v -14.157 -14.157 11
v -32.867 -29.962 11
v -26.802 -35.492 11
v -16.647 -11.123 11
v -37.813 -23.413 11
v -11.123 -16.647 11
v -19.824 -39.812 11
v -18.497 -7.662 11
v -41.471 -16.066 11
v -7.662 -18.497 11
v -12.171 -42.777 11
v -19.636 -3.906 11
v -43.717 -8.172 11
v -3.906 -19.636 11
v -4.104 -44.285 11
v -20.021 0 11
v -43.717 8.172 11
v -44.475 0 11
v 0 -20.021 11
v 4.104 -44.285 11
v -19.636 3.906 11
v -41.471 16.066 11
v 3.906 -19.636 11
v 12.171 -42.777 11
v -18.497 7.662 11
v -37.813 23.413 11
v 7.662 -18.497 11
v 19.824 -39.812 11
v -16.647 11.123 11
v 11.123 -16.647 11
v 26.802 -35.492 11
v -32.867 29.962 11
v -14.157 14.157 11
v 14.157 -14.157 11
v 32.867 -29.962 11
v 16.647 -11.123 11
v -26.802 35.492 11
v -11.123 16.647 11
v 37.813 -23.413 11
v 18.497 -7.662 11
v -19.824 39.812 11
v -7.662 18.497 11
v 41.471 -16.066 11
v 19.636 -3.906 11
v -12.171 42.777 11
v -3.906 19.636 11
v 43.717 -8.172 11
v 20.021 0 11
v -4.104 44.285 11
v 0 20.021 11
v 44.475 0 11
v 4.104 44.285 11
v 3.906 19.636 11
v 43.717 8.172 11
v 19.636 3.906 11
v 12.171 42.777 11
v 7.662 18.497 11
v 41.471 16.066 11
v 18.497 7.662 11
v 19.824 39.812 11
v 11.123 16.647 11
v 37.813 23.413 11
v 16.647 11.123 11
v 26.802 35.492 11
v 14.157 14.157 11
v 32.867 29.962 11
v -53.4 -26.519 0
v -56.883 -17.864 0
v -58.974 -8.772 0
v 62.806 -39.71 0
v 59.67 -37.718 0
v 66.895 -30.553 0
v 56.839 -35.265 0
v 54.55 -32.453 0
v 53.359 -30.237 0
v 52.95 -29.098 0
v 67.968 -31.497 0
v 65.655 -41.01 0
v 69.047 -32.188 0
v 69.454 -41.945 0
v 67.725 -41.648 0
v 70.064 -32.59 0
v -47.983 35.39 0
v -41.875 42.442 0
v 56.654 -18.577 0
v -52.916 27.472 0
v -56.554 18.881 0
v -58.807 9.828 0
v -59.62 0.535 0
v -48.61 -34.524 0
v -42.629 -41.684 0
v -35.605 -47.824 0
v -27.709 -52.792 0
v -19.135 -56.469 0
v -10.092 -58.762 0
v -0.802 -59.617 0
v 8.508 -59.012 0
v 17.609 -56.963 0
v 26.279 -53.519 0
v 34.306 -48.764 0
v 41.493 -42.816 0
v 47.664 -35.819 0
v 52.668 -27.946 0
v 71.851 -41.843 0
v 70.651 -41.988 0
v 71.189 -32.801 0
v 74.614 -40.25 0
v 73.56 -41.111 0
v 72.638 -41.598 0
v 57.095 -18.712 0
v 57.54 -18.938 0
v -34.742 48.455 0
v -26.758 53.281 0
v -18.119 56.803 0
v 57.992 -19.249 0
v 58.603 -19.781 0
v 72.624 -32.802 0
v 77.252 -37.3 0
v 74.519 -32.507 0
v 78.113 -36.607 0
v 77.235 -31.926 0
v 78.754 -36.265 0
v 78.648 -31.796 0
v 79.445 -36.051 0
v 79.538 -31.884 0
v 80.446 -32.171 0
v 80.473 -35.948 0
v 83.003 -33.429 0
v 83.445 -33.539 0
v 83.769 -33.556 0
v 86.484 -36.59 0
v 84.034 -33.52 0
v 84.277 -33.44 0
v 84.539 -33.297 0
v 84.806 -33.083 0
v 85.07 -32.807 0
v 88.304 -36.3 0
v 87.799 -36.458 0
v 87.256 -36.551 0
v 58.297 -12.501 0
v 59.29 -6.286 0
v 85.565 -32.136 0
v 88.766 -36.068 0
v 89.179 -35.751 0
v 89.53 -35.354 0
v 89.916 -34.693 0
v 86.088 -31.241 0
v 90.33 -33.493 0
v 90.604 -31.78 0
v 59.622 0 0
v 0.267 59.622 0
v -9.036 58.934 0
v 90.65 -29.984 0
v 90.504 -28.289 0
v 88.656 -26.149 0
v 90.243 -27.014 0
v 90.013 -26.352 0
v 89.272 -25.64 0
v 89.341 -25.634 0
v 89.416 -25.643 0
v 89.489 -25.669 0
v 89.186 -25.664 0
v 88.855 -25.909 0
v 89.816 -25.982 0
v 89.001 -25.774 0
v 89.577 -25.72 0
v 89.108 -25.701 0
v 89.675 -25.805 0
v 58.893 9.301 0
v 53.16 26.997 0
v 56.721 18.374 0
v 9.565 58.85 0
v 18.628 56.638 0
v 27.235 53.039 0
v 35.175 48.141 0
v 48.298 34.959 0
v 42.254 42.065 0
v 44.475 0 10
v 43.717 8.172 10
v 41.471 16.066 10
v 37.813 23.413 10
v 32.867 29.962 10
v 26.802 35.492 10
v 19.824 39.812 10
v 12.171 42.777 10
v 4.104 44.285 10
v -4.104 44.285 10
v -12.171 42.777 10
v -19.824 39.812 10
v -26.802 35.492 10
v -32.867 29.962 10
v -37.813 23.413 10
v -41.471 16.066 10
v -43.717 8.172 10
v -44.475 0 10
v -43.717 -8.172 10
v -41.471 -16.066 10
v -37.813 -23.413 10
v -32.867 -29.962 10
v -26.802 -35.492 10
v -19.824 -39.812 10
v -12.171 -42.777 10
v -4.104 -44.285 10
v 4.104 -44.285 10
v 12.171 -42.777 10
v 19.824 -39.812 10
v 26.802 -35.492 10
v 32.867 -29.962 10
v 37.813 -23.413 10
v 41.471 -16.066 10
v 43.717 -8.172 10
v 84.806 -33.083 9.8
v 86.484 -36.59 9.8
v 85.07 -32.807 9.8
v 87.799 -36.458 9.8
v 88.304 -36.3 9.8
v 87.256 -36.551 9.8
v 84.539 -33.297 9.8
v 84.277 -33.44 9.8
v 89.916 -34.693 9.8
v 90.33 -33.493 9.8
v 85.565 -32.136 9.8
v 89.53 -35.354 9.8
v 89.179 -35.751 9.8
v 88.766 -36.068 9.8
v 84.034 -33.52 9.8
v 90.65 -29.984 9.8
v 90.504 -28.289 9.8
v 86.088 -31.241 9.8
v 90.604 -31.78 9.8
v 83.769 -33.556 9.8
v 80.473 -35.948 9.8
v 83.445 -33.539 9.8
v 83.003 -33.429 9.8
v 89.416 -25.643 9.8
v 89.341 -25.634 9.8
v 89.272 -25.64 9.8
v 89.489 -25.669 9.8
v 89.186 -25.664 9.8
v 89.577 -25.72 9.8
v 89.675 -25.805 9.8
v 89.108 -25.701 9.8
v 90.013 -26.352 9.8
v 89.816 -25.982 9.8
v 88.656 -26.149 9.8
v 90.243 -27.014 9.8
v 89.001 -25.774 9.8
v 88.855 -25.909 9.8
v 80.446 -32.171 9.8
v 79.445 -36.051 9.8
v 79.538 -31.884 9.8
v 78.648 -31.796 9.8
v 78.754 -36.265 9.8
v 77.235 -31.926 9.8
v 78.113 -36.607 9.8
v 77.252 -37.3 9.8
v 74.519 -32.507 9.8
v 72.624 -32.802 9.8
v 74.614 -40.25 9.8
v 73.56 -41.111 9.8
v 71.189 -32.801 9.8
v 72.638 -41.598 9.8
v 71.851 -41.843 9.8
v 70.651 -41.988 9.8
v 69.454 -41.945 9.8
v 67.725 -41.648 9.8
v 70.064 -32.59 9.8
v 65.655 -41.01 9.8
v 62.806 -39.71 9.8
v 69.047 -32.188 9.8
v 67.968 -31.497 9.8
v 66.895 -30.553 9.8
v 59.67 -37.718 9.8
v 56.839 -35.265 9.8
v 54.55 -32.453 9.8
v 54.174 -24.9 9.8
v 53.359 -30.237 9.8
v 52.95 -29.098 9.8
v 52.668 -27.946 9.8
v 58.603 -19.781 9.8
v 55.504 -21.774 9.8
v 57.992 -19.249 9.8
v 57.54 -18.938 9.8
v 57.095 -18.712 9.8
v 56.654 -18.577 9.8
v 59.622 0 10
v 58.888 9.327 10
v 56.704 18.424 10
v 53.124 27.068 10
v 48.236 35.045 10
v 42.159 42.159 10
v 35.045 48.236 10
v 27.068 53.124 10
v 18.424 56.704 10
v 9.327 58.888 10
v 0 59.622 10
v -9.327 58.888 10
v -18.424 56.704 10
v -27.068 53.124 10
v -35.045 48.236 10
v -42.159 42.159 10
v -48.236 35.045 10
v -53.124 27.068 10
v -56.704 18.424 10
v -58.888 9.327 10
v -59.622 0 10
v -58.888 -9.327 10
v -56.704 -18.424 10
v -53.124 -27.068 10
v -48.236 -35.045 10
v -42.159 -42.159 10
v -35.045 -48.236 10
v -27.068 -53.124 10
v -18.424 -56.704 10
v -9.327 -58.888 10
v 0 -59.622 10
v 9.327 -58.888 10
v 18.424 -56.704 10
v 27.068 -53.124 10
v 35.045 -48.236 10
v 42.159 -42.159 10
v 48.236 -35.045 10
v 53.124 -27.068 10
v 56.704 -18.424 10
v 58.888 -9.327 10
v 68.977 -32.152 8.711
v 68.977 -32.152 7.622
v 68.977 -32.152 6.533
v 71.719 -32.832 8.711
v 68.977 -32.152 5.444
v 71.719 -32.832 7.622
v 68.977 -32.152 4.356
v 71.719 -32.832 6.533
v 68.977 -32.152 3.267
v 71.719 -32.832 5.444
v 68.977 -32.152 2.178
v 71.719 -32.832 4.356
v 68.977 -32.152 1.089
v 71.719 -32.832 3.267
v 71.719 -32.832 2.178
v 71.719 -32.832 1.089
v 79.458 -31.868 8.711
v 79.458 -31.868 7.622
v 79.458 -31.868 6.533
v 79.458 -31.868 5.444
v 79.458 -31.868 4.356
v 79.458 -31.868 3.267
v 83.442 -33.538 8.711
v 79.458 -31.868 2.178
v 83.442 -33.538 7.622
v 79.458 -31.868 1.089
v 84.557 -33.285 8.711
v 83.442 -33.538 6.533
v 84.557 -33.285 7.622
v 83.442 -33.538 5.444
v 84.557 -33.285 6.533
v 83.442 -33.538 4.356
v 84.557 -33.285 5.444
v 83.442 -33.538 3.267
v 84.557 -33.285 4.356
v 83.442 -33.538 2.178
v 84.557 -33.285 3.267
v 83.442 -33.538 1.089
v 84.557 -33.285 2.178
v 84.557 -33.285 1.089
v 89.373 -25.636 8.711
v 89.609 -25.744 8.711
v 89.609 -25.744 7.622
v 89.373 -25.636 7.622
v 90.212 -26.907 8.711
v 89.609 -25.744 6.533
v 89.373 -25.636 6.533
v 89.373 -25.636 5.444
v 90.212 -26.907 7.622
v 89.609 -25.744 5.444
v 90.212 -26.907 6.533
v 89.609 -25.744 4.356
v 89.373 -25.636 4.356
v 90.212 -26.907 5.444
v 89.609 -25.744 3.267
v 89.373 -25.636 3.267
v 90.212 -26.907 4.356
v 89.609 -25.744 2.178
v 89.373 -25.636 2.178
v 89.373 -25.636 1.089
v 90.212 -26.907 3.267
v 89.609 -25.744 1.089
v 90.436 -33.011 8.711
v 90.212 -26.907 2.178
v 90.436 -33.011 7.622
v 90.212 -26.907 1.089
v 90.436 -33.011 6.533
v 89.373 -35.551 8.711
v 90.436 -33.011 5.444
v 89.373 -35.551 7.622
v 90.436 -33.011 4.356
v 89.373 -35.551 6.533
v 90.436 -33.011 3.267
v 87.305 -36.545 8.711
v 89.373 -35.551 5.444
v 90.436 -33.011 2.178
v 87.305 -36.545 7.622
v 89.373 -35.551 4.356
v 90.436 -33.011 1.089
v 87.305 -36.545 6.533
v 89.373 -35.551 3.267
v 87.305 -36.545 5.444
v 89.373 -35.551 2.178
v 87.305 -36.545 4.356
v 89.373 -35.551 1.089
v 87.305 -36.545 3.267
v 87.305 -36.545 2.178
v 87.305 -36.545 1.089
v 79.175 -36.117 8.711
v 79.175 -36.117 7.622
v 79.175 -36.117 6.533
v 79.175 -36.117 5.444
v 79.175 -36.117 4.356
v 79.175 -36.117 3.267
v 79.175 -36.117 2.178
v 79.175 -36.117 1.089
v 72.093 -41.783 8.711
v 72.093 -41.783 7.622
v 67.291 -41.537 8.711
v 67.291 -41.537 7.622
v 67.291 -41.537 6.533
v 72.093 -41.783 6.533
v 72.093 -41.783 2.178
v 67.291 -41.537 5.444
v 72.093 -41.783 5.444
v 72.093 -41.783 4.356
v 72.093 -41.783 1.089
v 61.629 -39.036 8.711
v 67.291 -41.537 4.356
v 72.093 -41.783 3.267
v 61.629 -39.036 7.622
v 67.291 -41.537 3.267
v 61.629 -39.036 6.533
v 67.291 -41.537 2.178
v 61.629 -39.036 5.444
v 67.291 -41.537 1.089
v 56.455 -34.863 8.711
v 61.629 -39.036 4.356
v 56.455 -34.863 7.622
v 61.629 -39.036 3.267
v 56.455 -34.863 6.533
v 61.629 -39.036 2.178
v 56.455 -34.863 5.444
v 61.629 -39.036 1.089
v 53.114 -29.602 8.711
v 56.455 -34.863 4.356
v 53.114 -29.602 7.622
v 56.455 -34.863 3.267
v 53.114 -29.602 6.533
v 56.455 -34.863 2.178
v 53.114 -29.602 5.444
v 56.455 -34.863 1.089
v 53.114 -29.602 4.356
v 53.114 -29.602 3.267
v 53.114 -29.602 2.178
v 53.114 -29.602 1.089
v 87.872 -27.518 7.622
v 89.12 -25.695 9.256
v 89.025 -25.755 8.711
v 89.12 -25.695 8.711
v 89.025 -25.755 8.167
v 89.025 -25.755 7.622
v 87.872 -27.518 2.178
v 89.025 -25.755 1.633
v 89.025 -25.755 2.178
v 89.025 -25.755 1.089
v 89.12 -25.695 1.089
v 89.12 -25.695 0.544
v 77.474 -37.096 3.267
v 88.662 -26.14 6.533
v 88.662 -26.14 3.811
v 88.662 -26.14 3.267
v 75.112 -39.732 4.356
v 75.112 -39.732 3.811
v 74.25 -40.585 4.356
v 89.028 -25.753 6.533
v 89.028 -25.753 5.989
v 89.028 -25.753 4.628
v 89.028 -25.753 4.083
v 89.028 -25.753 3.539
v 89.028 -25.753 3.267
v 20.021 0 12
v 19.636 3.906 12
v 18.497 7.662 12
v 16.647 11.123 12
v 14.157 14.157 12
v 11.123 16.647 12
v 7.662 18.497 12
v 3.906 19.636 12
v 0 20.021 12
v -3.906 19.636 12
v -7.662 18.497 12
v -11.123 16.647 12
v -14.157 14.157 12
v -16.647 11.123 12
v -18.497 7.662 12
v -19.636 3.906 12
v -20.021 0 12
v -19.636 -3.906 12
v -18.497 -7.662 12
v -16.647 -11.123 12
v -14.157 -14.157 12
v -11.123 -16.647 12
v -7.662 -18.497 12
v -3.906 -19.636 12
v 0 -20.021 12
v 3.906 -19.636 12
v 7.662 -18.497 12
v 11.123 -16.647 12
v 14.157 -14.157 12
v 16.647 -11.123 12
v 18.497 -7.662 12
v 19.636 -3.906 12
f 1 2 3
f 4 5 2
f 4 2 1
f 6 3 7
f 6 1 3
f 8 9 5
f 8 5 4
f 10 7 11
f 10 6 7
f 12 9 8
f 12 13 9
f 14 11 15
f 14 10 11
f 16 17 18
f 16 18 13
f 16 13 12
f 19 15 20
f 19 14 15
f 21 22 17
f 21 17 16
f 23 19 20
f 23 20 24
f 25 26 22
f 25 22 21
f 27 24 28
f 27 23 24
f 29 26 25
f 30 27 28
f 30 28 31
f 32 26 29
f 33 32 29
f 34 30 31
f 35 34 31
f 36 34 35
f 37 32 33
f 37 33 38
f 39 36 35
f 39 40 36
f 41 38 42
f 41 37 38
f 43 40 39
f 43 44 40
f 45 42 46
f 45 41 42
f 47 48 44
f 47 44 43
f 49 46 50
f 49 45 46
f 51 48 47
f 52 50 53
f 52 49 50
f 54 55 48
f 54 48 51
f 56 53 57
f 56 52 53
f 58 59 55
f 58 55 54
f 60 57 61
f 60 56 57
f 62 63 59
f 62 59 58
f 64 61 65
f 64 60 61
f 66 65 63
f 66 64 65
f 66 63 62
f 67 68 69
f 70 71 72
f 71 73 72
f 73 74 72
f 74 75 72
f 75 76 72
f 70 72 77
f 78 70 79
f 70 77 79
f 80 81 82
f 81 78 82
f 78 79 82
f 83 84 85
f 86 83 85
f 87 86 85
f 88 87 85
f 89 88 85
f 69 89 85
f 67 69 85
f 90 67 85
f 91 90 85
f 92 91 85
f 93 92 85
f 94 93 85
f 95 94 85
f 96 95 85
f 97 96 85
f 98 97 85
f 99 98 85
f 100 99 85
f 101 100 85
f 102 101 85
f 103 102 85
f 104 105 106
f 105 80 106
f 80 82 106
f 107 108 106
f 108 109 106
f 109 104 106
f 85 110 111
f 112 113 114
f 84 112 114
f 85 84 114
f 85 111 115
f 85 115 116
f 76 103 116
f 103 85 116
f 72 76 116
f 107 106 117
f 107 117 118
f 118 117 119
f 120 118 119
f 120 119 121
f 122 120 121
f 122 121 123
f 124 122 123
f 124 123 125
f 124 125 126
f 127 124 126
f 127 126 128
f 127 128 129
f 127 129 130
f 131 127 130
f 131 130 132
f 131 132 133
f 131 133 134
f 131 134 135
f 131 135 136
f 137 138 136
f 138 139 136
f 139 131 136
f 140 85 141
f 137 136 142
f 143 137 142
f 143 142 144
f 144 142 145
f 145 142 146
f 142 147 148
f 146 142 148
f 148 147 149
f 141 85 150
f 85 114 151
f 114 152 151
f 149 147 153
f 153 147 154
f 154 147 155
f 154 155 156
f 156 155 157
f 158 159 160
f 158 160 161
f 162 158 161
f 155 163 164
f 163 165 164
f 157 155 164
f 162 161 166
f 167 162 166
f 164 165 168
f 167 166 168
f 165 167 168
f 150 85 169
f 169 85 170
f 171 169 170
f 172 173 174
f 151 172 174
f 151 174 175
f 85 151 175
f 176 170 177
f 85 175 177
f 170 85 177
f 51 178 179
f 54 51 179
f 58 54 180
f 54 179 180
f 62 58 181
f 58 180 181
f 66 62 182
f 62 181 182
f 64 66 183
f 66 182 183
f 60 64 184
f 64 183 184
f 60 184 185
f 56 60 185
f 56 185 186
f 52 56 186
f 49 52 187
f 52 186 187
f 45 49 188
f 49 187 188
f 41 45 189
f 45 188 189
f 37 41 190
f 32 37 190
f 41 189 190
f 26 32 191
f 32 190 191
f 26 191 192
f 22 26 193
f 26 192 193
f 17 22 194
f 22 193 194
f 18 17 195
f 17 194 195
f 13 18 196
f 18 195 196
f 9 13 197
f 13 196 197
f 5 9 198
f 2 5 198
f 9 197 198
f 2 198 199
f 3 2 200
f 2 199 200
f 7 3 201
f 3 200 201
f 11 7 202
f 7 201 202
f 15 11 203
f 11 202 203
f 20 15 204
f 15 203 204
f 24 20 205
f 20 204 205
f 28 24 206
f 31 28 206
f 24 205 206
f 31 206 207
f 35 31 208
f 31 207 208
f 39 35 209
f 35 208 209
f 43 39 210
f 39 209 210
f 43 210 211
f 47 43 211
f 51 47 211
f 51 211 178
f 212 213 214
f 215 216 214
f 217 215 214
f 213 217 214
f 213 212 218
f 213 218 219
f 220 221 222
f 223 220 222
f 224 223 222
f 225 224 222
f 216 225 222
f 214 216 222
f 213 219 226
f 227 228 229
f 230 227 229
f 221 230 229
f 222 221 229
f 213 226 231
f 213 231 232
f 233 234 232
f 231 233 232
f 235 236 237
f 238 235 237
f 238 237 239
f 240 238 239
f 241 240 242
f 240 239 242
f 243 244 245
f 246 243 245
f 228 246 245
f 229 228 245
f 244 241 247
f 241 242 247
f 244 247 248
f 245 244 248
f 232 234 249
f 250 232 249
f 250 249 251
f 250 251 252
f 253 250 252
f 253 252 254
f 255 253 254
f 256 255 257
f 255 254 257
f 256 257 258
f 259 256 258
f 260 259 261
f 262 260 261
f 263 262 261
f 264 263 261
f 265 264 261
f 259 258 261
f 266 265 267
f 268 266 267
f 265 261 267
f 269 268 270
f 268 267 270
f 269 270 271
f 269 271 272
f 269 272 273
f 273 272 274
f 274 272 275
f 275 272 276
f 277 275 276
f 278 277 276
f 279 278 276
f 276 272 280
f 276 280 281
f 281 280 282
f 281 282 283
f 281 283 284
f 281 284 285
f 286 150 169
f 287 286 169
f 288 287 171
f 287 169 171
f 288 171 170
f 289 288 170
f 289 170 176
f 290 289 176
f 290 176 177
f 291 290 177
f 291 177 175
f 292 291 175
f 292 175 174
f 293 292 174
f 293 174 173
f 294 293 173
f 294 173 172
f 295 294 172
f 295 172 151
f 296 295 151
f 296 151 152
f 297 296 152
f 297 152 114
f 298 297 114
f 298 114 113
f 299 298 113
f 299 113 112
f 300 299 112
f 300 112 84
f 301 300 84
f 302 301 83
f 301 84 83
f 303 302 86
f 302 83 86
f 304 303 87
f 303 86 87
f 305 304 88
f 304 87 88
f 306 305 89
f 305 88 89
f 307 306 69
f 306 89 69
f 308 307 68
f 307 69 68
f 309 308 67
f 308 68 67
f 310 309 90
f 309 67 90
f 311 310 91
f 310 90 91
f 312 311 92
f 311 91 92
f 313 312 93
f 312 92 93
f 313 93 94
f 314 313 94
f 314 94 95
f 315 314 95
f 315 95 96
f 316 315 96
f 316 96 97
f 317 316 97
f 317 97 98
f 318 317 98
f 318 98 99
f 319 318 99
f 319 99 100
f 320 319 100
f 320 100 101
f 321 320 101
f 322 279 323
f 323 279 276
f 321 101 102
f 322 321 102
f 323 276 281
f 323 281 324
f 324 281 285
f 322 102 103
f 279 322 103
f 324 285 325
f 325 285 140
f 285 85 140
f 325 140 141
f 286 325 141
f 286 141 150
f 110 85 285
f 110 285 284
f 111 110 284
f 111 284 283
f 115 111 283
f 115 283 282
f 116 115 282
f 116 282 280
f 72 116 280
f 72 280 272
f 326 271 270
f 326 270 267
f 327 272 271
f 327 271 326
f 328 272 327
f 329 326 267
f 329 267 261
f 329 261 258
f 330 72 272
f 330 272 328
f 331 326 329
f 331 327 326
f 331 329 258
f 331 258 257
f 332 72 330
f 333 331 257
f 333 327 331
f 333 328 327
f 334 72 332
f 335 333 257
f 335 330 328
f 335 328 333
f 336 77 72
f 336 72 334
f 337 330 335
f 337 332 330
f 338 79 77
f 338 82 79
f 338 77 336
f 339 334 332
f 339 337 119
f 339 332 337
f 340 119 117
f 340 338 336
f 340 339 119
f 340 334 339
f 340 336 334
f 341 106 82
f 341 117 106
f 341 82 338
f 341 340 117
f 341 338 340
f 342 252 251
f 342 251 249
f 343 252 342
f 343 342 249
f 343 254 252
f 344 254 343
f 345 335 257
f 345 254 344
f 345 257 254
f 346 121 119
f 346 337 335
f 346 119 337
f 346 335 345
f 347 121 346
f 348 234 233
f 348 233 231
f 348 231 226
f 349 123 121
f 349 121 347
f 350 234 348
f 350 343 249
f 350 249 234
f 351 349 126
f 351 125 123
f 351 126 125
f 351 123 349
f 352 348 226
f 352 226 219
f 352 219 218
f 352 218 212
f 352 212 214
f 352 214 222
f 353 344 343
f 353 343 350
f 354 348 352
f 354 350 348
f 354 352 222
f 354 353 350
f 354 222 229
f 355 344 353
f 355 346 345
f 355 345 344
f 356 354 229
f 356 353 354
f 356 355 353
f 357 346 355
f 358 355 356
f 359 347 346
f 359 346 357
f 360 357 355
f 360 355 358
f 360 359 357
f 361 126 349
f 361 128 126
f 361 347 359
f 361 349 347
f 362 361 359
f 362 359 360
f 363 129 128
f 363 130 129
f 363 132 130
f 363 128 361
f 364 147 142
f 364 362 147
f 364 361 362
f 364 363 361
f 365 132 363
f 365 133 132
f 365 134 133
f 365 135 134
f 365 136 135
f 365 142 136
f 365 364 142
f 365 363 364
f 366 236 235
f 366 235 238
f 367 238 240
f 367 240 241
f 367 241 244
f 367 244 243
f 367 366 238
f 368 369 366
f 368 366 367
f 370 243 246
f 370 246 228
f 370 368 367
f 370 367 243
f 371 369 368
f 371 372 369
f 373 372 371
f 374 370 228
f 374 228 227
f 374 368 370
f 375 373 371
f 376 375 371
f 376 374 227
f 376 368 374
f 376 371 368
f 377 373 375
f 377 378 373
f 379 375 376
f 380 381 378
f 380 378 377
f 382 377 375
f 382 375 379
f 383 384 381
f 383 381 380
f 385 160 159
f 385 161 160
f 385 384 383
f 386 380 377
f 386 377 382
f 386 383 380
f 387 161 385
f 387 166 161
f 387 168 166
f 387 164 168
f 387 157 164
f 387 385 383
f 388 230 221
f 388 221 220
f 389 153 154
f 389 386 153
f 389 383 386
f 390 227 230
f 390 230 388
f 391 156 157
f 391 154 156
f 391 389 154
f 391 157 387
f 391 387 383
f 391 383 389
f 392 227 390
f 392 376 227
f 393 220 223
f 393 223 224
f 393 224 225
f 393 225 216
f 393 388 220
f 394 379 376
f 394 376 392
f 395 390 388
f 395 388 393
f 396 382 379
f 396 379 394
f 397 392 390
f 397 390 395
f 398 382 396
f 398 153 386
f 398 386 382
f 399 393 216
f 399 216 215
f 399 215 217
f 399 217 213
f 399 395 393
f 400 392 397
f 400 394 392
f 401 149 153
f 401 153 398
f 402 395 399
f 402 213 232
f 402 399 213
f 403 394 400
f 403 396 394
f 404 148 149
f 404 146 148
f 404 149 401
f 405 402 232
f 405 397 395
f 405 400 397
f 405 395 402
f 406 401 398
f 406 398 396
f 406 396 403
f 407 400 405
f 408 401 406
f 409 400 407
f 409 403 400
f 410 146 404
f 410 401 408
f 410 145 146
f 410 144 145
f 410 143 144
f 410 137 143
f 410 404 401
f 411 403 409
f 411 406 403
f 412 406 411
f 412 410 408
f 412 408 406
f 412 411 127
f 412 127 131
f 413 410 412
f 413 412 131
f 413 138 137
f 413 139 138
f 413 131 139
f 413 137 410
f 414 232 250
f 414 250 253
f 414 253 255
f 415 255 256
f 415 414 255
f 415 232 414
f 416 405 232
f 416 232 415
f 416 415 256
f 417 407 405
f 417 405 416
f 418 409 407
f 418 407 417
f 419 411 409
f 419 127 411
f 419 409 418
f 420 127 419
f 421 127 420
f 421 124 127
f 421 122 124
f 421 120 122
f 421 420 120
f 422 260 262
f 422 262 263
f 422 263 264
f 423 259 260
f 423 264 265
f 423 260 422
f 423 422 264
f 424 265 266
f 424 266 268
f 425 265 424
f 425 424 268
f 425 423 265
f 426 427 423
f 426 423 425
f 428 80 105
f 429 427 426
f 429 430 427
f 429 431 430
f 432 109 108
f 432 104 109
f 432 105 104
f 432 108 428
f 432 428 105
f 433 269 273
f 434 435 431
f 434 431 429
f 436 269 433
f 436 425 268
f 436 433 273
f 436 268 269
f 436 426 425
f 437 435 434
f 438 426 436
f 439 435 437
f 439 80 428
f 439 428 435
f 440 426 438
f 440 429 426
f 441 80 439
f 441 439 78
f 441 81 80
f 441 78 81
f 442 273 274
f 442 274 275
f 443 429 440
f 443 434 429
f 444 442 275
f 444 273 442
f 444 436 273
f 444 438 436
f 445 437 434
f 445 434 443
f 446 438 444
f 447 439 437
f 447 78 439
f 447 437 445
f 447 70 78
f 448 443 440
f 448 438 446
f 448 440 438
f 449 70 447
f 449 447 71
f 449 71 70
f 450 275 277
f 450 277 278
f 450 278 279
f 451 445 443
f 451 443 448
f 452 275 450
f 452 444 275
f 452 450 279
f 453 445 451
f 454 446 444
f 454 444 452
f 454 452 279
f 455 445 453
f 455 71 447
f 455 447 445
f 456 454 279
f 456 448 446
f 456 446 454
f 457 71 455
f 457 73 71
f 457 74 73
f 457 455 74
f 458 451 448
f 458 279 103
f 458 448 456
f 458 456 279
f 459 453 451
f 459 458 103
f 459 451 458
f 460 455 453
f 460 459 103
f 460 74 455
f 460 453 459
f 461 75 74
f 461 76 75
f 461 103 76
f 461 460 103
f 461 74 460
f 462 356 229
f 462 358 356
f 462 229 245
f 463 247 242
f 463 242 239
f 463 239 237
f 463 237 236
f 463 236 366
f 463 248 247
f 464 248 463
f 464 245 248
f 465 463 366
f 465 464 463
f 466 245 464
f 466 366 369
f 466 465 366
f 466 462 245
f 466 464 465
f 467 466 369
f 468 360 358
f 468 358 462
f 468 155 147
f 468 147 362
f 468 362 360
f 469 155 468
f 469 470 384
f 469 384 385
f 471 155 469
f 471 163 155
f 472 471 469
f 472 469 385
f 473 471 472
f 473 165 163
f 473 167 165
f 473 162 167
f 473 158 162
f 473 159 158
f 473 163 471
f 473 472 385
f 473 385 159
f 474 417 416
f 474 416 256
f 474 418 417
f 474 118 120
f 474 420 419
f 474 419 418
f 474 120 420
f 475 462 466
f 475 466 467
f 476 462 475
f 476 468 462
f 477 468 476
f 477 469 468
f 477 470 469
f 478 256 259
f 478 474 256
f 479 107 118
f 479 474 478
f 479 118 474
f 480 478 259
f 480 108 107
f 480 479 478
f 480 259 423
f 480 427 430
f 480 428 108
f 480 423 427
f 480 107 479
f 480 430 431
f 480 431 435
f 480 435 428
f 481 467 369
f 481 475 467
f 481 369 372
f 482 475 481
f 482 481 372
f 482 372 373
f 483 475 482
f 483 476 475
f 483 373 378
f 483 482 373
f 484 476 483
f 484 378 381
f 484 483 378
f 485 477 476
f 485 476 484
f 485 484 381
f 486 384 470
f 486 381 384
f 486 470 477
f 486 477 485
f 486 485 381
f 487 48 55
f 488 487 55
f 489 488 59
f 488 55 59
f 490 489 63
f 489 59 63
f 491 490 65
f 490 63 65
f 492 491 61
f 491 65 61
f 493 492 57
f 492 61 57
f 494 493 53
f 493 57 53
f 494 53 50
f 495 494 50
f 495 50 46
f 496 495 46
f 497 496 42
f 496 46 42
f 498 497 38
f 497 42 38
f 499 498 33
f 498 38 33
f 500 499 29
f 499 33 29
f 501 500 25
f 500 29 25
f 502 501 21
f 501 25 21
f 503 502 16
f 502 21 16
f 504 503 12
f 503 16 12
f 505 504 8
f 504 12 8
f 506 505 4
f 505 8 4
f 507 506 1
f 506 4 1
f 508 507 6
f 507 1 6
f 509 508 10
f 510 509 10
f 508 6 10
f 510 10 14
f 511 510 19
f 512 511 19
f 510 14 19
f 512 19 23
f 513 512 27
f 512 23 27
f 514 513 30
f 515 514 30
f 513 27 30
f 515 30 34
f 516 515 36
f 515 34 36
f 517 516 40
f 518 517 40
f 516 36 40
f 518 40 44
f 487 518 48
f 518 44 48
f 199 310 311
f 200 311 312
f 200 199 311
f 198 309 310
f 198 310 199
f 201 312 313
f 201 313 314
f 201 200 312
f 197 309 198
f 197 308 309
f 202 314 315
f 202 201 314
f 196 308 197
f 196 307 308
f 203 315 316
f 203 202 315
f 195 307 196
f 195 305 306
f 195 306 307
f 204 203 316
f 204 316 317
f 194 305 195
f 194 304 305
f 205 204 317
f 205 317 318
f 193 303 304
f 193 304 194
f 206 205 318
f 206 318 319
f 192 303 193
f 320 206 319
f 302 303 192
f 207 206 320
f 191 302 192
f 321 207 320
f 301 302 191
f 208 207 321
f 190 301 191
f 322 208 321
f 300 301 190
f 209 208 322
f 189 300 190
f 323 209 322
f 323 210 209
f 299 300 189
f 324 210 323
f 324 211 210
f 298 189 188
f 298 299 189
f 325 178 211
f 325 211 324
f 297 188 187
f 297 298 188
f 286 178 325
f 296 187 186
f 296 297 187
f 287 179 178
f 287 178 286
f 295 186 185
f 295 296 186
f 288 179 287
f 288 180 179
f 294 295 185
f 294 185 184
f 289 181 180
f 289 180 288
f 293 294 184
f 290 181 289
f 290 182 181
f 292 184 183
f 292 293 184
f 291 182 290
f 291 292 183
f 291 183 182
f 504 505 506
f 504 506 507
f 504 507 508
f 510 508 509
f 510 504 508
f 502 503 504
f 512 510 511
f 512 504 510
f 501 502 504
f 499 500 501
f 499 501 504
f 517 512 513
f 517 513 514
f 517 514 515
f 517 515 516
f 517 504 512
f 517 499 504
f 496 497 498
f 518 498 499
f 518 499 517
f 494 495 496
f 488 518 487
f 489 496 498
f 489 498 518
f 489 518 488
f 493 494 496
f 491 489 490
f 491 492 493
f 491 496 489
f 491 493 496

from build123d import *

# Parameters (mm, degrees)
F0_R     = 59.6224836618
F1_DEPTH = 10
F3_DEPTH = 9.8
F4_R     = 44.4747634624
F5_DEPTH = 1
F6_R     = 20.0209897177
F7_DEPTH = 1


with BuildPart() as f1:
    # F0 (on Top) → F1 (new body)
    with BuildSketch(Plane.XY):
        Circle(F0_R)
    extrude(amount=F1_DEPTH)

    # F2 (on Top) → F3 (join)
    with BuildSketch(Plane.XY):
        with BuildLine():
            add(Edge.make_bspline(
                [(56.5130375326, -18.5544081032), (60.0763262418, -18.9953652644), (67.3262792735, -37.6573614559), (79.3351223139, -29.3947307126), (85.1575232368, -36.9354653922), (89.9066222538, -18.7235374034), (92.2681941092, -40.6508908401), (77.3666407475, -32.7165747954), (73.9125938653, -47.1112836436), (47.7879996897, -32.6872077765), (53.6922975171, -18.2053413812), (56.5130375326, -18.5544081032)],
                knots=[0, 0, 0, 0, 0.1415353666, 0.2482449813, 0.3240555858, 0.4231297511, 0.5268963376, 0.6322159605, 0.7314599749, 0.8879589882, 1, 1, 1, 1], degree=3))
        make_face()
    extrude(amount=F3_DEPTH)

    # F4 (on face) → F5 (join)
    with BuildSketch(Plane.XY.offset(10)):
        Circle(F4_R)
    extrude(amount=F5_DEPTH)

    # F6 (on face) → F7 (join)
    with BuildSketch(Plane.XY.offset(11)):
        Circle(F6_R)
    extrude(amount=F7_DEPTH)


solid = f1.part
